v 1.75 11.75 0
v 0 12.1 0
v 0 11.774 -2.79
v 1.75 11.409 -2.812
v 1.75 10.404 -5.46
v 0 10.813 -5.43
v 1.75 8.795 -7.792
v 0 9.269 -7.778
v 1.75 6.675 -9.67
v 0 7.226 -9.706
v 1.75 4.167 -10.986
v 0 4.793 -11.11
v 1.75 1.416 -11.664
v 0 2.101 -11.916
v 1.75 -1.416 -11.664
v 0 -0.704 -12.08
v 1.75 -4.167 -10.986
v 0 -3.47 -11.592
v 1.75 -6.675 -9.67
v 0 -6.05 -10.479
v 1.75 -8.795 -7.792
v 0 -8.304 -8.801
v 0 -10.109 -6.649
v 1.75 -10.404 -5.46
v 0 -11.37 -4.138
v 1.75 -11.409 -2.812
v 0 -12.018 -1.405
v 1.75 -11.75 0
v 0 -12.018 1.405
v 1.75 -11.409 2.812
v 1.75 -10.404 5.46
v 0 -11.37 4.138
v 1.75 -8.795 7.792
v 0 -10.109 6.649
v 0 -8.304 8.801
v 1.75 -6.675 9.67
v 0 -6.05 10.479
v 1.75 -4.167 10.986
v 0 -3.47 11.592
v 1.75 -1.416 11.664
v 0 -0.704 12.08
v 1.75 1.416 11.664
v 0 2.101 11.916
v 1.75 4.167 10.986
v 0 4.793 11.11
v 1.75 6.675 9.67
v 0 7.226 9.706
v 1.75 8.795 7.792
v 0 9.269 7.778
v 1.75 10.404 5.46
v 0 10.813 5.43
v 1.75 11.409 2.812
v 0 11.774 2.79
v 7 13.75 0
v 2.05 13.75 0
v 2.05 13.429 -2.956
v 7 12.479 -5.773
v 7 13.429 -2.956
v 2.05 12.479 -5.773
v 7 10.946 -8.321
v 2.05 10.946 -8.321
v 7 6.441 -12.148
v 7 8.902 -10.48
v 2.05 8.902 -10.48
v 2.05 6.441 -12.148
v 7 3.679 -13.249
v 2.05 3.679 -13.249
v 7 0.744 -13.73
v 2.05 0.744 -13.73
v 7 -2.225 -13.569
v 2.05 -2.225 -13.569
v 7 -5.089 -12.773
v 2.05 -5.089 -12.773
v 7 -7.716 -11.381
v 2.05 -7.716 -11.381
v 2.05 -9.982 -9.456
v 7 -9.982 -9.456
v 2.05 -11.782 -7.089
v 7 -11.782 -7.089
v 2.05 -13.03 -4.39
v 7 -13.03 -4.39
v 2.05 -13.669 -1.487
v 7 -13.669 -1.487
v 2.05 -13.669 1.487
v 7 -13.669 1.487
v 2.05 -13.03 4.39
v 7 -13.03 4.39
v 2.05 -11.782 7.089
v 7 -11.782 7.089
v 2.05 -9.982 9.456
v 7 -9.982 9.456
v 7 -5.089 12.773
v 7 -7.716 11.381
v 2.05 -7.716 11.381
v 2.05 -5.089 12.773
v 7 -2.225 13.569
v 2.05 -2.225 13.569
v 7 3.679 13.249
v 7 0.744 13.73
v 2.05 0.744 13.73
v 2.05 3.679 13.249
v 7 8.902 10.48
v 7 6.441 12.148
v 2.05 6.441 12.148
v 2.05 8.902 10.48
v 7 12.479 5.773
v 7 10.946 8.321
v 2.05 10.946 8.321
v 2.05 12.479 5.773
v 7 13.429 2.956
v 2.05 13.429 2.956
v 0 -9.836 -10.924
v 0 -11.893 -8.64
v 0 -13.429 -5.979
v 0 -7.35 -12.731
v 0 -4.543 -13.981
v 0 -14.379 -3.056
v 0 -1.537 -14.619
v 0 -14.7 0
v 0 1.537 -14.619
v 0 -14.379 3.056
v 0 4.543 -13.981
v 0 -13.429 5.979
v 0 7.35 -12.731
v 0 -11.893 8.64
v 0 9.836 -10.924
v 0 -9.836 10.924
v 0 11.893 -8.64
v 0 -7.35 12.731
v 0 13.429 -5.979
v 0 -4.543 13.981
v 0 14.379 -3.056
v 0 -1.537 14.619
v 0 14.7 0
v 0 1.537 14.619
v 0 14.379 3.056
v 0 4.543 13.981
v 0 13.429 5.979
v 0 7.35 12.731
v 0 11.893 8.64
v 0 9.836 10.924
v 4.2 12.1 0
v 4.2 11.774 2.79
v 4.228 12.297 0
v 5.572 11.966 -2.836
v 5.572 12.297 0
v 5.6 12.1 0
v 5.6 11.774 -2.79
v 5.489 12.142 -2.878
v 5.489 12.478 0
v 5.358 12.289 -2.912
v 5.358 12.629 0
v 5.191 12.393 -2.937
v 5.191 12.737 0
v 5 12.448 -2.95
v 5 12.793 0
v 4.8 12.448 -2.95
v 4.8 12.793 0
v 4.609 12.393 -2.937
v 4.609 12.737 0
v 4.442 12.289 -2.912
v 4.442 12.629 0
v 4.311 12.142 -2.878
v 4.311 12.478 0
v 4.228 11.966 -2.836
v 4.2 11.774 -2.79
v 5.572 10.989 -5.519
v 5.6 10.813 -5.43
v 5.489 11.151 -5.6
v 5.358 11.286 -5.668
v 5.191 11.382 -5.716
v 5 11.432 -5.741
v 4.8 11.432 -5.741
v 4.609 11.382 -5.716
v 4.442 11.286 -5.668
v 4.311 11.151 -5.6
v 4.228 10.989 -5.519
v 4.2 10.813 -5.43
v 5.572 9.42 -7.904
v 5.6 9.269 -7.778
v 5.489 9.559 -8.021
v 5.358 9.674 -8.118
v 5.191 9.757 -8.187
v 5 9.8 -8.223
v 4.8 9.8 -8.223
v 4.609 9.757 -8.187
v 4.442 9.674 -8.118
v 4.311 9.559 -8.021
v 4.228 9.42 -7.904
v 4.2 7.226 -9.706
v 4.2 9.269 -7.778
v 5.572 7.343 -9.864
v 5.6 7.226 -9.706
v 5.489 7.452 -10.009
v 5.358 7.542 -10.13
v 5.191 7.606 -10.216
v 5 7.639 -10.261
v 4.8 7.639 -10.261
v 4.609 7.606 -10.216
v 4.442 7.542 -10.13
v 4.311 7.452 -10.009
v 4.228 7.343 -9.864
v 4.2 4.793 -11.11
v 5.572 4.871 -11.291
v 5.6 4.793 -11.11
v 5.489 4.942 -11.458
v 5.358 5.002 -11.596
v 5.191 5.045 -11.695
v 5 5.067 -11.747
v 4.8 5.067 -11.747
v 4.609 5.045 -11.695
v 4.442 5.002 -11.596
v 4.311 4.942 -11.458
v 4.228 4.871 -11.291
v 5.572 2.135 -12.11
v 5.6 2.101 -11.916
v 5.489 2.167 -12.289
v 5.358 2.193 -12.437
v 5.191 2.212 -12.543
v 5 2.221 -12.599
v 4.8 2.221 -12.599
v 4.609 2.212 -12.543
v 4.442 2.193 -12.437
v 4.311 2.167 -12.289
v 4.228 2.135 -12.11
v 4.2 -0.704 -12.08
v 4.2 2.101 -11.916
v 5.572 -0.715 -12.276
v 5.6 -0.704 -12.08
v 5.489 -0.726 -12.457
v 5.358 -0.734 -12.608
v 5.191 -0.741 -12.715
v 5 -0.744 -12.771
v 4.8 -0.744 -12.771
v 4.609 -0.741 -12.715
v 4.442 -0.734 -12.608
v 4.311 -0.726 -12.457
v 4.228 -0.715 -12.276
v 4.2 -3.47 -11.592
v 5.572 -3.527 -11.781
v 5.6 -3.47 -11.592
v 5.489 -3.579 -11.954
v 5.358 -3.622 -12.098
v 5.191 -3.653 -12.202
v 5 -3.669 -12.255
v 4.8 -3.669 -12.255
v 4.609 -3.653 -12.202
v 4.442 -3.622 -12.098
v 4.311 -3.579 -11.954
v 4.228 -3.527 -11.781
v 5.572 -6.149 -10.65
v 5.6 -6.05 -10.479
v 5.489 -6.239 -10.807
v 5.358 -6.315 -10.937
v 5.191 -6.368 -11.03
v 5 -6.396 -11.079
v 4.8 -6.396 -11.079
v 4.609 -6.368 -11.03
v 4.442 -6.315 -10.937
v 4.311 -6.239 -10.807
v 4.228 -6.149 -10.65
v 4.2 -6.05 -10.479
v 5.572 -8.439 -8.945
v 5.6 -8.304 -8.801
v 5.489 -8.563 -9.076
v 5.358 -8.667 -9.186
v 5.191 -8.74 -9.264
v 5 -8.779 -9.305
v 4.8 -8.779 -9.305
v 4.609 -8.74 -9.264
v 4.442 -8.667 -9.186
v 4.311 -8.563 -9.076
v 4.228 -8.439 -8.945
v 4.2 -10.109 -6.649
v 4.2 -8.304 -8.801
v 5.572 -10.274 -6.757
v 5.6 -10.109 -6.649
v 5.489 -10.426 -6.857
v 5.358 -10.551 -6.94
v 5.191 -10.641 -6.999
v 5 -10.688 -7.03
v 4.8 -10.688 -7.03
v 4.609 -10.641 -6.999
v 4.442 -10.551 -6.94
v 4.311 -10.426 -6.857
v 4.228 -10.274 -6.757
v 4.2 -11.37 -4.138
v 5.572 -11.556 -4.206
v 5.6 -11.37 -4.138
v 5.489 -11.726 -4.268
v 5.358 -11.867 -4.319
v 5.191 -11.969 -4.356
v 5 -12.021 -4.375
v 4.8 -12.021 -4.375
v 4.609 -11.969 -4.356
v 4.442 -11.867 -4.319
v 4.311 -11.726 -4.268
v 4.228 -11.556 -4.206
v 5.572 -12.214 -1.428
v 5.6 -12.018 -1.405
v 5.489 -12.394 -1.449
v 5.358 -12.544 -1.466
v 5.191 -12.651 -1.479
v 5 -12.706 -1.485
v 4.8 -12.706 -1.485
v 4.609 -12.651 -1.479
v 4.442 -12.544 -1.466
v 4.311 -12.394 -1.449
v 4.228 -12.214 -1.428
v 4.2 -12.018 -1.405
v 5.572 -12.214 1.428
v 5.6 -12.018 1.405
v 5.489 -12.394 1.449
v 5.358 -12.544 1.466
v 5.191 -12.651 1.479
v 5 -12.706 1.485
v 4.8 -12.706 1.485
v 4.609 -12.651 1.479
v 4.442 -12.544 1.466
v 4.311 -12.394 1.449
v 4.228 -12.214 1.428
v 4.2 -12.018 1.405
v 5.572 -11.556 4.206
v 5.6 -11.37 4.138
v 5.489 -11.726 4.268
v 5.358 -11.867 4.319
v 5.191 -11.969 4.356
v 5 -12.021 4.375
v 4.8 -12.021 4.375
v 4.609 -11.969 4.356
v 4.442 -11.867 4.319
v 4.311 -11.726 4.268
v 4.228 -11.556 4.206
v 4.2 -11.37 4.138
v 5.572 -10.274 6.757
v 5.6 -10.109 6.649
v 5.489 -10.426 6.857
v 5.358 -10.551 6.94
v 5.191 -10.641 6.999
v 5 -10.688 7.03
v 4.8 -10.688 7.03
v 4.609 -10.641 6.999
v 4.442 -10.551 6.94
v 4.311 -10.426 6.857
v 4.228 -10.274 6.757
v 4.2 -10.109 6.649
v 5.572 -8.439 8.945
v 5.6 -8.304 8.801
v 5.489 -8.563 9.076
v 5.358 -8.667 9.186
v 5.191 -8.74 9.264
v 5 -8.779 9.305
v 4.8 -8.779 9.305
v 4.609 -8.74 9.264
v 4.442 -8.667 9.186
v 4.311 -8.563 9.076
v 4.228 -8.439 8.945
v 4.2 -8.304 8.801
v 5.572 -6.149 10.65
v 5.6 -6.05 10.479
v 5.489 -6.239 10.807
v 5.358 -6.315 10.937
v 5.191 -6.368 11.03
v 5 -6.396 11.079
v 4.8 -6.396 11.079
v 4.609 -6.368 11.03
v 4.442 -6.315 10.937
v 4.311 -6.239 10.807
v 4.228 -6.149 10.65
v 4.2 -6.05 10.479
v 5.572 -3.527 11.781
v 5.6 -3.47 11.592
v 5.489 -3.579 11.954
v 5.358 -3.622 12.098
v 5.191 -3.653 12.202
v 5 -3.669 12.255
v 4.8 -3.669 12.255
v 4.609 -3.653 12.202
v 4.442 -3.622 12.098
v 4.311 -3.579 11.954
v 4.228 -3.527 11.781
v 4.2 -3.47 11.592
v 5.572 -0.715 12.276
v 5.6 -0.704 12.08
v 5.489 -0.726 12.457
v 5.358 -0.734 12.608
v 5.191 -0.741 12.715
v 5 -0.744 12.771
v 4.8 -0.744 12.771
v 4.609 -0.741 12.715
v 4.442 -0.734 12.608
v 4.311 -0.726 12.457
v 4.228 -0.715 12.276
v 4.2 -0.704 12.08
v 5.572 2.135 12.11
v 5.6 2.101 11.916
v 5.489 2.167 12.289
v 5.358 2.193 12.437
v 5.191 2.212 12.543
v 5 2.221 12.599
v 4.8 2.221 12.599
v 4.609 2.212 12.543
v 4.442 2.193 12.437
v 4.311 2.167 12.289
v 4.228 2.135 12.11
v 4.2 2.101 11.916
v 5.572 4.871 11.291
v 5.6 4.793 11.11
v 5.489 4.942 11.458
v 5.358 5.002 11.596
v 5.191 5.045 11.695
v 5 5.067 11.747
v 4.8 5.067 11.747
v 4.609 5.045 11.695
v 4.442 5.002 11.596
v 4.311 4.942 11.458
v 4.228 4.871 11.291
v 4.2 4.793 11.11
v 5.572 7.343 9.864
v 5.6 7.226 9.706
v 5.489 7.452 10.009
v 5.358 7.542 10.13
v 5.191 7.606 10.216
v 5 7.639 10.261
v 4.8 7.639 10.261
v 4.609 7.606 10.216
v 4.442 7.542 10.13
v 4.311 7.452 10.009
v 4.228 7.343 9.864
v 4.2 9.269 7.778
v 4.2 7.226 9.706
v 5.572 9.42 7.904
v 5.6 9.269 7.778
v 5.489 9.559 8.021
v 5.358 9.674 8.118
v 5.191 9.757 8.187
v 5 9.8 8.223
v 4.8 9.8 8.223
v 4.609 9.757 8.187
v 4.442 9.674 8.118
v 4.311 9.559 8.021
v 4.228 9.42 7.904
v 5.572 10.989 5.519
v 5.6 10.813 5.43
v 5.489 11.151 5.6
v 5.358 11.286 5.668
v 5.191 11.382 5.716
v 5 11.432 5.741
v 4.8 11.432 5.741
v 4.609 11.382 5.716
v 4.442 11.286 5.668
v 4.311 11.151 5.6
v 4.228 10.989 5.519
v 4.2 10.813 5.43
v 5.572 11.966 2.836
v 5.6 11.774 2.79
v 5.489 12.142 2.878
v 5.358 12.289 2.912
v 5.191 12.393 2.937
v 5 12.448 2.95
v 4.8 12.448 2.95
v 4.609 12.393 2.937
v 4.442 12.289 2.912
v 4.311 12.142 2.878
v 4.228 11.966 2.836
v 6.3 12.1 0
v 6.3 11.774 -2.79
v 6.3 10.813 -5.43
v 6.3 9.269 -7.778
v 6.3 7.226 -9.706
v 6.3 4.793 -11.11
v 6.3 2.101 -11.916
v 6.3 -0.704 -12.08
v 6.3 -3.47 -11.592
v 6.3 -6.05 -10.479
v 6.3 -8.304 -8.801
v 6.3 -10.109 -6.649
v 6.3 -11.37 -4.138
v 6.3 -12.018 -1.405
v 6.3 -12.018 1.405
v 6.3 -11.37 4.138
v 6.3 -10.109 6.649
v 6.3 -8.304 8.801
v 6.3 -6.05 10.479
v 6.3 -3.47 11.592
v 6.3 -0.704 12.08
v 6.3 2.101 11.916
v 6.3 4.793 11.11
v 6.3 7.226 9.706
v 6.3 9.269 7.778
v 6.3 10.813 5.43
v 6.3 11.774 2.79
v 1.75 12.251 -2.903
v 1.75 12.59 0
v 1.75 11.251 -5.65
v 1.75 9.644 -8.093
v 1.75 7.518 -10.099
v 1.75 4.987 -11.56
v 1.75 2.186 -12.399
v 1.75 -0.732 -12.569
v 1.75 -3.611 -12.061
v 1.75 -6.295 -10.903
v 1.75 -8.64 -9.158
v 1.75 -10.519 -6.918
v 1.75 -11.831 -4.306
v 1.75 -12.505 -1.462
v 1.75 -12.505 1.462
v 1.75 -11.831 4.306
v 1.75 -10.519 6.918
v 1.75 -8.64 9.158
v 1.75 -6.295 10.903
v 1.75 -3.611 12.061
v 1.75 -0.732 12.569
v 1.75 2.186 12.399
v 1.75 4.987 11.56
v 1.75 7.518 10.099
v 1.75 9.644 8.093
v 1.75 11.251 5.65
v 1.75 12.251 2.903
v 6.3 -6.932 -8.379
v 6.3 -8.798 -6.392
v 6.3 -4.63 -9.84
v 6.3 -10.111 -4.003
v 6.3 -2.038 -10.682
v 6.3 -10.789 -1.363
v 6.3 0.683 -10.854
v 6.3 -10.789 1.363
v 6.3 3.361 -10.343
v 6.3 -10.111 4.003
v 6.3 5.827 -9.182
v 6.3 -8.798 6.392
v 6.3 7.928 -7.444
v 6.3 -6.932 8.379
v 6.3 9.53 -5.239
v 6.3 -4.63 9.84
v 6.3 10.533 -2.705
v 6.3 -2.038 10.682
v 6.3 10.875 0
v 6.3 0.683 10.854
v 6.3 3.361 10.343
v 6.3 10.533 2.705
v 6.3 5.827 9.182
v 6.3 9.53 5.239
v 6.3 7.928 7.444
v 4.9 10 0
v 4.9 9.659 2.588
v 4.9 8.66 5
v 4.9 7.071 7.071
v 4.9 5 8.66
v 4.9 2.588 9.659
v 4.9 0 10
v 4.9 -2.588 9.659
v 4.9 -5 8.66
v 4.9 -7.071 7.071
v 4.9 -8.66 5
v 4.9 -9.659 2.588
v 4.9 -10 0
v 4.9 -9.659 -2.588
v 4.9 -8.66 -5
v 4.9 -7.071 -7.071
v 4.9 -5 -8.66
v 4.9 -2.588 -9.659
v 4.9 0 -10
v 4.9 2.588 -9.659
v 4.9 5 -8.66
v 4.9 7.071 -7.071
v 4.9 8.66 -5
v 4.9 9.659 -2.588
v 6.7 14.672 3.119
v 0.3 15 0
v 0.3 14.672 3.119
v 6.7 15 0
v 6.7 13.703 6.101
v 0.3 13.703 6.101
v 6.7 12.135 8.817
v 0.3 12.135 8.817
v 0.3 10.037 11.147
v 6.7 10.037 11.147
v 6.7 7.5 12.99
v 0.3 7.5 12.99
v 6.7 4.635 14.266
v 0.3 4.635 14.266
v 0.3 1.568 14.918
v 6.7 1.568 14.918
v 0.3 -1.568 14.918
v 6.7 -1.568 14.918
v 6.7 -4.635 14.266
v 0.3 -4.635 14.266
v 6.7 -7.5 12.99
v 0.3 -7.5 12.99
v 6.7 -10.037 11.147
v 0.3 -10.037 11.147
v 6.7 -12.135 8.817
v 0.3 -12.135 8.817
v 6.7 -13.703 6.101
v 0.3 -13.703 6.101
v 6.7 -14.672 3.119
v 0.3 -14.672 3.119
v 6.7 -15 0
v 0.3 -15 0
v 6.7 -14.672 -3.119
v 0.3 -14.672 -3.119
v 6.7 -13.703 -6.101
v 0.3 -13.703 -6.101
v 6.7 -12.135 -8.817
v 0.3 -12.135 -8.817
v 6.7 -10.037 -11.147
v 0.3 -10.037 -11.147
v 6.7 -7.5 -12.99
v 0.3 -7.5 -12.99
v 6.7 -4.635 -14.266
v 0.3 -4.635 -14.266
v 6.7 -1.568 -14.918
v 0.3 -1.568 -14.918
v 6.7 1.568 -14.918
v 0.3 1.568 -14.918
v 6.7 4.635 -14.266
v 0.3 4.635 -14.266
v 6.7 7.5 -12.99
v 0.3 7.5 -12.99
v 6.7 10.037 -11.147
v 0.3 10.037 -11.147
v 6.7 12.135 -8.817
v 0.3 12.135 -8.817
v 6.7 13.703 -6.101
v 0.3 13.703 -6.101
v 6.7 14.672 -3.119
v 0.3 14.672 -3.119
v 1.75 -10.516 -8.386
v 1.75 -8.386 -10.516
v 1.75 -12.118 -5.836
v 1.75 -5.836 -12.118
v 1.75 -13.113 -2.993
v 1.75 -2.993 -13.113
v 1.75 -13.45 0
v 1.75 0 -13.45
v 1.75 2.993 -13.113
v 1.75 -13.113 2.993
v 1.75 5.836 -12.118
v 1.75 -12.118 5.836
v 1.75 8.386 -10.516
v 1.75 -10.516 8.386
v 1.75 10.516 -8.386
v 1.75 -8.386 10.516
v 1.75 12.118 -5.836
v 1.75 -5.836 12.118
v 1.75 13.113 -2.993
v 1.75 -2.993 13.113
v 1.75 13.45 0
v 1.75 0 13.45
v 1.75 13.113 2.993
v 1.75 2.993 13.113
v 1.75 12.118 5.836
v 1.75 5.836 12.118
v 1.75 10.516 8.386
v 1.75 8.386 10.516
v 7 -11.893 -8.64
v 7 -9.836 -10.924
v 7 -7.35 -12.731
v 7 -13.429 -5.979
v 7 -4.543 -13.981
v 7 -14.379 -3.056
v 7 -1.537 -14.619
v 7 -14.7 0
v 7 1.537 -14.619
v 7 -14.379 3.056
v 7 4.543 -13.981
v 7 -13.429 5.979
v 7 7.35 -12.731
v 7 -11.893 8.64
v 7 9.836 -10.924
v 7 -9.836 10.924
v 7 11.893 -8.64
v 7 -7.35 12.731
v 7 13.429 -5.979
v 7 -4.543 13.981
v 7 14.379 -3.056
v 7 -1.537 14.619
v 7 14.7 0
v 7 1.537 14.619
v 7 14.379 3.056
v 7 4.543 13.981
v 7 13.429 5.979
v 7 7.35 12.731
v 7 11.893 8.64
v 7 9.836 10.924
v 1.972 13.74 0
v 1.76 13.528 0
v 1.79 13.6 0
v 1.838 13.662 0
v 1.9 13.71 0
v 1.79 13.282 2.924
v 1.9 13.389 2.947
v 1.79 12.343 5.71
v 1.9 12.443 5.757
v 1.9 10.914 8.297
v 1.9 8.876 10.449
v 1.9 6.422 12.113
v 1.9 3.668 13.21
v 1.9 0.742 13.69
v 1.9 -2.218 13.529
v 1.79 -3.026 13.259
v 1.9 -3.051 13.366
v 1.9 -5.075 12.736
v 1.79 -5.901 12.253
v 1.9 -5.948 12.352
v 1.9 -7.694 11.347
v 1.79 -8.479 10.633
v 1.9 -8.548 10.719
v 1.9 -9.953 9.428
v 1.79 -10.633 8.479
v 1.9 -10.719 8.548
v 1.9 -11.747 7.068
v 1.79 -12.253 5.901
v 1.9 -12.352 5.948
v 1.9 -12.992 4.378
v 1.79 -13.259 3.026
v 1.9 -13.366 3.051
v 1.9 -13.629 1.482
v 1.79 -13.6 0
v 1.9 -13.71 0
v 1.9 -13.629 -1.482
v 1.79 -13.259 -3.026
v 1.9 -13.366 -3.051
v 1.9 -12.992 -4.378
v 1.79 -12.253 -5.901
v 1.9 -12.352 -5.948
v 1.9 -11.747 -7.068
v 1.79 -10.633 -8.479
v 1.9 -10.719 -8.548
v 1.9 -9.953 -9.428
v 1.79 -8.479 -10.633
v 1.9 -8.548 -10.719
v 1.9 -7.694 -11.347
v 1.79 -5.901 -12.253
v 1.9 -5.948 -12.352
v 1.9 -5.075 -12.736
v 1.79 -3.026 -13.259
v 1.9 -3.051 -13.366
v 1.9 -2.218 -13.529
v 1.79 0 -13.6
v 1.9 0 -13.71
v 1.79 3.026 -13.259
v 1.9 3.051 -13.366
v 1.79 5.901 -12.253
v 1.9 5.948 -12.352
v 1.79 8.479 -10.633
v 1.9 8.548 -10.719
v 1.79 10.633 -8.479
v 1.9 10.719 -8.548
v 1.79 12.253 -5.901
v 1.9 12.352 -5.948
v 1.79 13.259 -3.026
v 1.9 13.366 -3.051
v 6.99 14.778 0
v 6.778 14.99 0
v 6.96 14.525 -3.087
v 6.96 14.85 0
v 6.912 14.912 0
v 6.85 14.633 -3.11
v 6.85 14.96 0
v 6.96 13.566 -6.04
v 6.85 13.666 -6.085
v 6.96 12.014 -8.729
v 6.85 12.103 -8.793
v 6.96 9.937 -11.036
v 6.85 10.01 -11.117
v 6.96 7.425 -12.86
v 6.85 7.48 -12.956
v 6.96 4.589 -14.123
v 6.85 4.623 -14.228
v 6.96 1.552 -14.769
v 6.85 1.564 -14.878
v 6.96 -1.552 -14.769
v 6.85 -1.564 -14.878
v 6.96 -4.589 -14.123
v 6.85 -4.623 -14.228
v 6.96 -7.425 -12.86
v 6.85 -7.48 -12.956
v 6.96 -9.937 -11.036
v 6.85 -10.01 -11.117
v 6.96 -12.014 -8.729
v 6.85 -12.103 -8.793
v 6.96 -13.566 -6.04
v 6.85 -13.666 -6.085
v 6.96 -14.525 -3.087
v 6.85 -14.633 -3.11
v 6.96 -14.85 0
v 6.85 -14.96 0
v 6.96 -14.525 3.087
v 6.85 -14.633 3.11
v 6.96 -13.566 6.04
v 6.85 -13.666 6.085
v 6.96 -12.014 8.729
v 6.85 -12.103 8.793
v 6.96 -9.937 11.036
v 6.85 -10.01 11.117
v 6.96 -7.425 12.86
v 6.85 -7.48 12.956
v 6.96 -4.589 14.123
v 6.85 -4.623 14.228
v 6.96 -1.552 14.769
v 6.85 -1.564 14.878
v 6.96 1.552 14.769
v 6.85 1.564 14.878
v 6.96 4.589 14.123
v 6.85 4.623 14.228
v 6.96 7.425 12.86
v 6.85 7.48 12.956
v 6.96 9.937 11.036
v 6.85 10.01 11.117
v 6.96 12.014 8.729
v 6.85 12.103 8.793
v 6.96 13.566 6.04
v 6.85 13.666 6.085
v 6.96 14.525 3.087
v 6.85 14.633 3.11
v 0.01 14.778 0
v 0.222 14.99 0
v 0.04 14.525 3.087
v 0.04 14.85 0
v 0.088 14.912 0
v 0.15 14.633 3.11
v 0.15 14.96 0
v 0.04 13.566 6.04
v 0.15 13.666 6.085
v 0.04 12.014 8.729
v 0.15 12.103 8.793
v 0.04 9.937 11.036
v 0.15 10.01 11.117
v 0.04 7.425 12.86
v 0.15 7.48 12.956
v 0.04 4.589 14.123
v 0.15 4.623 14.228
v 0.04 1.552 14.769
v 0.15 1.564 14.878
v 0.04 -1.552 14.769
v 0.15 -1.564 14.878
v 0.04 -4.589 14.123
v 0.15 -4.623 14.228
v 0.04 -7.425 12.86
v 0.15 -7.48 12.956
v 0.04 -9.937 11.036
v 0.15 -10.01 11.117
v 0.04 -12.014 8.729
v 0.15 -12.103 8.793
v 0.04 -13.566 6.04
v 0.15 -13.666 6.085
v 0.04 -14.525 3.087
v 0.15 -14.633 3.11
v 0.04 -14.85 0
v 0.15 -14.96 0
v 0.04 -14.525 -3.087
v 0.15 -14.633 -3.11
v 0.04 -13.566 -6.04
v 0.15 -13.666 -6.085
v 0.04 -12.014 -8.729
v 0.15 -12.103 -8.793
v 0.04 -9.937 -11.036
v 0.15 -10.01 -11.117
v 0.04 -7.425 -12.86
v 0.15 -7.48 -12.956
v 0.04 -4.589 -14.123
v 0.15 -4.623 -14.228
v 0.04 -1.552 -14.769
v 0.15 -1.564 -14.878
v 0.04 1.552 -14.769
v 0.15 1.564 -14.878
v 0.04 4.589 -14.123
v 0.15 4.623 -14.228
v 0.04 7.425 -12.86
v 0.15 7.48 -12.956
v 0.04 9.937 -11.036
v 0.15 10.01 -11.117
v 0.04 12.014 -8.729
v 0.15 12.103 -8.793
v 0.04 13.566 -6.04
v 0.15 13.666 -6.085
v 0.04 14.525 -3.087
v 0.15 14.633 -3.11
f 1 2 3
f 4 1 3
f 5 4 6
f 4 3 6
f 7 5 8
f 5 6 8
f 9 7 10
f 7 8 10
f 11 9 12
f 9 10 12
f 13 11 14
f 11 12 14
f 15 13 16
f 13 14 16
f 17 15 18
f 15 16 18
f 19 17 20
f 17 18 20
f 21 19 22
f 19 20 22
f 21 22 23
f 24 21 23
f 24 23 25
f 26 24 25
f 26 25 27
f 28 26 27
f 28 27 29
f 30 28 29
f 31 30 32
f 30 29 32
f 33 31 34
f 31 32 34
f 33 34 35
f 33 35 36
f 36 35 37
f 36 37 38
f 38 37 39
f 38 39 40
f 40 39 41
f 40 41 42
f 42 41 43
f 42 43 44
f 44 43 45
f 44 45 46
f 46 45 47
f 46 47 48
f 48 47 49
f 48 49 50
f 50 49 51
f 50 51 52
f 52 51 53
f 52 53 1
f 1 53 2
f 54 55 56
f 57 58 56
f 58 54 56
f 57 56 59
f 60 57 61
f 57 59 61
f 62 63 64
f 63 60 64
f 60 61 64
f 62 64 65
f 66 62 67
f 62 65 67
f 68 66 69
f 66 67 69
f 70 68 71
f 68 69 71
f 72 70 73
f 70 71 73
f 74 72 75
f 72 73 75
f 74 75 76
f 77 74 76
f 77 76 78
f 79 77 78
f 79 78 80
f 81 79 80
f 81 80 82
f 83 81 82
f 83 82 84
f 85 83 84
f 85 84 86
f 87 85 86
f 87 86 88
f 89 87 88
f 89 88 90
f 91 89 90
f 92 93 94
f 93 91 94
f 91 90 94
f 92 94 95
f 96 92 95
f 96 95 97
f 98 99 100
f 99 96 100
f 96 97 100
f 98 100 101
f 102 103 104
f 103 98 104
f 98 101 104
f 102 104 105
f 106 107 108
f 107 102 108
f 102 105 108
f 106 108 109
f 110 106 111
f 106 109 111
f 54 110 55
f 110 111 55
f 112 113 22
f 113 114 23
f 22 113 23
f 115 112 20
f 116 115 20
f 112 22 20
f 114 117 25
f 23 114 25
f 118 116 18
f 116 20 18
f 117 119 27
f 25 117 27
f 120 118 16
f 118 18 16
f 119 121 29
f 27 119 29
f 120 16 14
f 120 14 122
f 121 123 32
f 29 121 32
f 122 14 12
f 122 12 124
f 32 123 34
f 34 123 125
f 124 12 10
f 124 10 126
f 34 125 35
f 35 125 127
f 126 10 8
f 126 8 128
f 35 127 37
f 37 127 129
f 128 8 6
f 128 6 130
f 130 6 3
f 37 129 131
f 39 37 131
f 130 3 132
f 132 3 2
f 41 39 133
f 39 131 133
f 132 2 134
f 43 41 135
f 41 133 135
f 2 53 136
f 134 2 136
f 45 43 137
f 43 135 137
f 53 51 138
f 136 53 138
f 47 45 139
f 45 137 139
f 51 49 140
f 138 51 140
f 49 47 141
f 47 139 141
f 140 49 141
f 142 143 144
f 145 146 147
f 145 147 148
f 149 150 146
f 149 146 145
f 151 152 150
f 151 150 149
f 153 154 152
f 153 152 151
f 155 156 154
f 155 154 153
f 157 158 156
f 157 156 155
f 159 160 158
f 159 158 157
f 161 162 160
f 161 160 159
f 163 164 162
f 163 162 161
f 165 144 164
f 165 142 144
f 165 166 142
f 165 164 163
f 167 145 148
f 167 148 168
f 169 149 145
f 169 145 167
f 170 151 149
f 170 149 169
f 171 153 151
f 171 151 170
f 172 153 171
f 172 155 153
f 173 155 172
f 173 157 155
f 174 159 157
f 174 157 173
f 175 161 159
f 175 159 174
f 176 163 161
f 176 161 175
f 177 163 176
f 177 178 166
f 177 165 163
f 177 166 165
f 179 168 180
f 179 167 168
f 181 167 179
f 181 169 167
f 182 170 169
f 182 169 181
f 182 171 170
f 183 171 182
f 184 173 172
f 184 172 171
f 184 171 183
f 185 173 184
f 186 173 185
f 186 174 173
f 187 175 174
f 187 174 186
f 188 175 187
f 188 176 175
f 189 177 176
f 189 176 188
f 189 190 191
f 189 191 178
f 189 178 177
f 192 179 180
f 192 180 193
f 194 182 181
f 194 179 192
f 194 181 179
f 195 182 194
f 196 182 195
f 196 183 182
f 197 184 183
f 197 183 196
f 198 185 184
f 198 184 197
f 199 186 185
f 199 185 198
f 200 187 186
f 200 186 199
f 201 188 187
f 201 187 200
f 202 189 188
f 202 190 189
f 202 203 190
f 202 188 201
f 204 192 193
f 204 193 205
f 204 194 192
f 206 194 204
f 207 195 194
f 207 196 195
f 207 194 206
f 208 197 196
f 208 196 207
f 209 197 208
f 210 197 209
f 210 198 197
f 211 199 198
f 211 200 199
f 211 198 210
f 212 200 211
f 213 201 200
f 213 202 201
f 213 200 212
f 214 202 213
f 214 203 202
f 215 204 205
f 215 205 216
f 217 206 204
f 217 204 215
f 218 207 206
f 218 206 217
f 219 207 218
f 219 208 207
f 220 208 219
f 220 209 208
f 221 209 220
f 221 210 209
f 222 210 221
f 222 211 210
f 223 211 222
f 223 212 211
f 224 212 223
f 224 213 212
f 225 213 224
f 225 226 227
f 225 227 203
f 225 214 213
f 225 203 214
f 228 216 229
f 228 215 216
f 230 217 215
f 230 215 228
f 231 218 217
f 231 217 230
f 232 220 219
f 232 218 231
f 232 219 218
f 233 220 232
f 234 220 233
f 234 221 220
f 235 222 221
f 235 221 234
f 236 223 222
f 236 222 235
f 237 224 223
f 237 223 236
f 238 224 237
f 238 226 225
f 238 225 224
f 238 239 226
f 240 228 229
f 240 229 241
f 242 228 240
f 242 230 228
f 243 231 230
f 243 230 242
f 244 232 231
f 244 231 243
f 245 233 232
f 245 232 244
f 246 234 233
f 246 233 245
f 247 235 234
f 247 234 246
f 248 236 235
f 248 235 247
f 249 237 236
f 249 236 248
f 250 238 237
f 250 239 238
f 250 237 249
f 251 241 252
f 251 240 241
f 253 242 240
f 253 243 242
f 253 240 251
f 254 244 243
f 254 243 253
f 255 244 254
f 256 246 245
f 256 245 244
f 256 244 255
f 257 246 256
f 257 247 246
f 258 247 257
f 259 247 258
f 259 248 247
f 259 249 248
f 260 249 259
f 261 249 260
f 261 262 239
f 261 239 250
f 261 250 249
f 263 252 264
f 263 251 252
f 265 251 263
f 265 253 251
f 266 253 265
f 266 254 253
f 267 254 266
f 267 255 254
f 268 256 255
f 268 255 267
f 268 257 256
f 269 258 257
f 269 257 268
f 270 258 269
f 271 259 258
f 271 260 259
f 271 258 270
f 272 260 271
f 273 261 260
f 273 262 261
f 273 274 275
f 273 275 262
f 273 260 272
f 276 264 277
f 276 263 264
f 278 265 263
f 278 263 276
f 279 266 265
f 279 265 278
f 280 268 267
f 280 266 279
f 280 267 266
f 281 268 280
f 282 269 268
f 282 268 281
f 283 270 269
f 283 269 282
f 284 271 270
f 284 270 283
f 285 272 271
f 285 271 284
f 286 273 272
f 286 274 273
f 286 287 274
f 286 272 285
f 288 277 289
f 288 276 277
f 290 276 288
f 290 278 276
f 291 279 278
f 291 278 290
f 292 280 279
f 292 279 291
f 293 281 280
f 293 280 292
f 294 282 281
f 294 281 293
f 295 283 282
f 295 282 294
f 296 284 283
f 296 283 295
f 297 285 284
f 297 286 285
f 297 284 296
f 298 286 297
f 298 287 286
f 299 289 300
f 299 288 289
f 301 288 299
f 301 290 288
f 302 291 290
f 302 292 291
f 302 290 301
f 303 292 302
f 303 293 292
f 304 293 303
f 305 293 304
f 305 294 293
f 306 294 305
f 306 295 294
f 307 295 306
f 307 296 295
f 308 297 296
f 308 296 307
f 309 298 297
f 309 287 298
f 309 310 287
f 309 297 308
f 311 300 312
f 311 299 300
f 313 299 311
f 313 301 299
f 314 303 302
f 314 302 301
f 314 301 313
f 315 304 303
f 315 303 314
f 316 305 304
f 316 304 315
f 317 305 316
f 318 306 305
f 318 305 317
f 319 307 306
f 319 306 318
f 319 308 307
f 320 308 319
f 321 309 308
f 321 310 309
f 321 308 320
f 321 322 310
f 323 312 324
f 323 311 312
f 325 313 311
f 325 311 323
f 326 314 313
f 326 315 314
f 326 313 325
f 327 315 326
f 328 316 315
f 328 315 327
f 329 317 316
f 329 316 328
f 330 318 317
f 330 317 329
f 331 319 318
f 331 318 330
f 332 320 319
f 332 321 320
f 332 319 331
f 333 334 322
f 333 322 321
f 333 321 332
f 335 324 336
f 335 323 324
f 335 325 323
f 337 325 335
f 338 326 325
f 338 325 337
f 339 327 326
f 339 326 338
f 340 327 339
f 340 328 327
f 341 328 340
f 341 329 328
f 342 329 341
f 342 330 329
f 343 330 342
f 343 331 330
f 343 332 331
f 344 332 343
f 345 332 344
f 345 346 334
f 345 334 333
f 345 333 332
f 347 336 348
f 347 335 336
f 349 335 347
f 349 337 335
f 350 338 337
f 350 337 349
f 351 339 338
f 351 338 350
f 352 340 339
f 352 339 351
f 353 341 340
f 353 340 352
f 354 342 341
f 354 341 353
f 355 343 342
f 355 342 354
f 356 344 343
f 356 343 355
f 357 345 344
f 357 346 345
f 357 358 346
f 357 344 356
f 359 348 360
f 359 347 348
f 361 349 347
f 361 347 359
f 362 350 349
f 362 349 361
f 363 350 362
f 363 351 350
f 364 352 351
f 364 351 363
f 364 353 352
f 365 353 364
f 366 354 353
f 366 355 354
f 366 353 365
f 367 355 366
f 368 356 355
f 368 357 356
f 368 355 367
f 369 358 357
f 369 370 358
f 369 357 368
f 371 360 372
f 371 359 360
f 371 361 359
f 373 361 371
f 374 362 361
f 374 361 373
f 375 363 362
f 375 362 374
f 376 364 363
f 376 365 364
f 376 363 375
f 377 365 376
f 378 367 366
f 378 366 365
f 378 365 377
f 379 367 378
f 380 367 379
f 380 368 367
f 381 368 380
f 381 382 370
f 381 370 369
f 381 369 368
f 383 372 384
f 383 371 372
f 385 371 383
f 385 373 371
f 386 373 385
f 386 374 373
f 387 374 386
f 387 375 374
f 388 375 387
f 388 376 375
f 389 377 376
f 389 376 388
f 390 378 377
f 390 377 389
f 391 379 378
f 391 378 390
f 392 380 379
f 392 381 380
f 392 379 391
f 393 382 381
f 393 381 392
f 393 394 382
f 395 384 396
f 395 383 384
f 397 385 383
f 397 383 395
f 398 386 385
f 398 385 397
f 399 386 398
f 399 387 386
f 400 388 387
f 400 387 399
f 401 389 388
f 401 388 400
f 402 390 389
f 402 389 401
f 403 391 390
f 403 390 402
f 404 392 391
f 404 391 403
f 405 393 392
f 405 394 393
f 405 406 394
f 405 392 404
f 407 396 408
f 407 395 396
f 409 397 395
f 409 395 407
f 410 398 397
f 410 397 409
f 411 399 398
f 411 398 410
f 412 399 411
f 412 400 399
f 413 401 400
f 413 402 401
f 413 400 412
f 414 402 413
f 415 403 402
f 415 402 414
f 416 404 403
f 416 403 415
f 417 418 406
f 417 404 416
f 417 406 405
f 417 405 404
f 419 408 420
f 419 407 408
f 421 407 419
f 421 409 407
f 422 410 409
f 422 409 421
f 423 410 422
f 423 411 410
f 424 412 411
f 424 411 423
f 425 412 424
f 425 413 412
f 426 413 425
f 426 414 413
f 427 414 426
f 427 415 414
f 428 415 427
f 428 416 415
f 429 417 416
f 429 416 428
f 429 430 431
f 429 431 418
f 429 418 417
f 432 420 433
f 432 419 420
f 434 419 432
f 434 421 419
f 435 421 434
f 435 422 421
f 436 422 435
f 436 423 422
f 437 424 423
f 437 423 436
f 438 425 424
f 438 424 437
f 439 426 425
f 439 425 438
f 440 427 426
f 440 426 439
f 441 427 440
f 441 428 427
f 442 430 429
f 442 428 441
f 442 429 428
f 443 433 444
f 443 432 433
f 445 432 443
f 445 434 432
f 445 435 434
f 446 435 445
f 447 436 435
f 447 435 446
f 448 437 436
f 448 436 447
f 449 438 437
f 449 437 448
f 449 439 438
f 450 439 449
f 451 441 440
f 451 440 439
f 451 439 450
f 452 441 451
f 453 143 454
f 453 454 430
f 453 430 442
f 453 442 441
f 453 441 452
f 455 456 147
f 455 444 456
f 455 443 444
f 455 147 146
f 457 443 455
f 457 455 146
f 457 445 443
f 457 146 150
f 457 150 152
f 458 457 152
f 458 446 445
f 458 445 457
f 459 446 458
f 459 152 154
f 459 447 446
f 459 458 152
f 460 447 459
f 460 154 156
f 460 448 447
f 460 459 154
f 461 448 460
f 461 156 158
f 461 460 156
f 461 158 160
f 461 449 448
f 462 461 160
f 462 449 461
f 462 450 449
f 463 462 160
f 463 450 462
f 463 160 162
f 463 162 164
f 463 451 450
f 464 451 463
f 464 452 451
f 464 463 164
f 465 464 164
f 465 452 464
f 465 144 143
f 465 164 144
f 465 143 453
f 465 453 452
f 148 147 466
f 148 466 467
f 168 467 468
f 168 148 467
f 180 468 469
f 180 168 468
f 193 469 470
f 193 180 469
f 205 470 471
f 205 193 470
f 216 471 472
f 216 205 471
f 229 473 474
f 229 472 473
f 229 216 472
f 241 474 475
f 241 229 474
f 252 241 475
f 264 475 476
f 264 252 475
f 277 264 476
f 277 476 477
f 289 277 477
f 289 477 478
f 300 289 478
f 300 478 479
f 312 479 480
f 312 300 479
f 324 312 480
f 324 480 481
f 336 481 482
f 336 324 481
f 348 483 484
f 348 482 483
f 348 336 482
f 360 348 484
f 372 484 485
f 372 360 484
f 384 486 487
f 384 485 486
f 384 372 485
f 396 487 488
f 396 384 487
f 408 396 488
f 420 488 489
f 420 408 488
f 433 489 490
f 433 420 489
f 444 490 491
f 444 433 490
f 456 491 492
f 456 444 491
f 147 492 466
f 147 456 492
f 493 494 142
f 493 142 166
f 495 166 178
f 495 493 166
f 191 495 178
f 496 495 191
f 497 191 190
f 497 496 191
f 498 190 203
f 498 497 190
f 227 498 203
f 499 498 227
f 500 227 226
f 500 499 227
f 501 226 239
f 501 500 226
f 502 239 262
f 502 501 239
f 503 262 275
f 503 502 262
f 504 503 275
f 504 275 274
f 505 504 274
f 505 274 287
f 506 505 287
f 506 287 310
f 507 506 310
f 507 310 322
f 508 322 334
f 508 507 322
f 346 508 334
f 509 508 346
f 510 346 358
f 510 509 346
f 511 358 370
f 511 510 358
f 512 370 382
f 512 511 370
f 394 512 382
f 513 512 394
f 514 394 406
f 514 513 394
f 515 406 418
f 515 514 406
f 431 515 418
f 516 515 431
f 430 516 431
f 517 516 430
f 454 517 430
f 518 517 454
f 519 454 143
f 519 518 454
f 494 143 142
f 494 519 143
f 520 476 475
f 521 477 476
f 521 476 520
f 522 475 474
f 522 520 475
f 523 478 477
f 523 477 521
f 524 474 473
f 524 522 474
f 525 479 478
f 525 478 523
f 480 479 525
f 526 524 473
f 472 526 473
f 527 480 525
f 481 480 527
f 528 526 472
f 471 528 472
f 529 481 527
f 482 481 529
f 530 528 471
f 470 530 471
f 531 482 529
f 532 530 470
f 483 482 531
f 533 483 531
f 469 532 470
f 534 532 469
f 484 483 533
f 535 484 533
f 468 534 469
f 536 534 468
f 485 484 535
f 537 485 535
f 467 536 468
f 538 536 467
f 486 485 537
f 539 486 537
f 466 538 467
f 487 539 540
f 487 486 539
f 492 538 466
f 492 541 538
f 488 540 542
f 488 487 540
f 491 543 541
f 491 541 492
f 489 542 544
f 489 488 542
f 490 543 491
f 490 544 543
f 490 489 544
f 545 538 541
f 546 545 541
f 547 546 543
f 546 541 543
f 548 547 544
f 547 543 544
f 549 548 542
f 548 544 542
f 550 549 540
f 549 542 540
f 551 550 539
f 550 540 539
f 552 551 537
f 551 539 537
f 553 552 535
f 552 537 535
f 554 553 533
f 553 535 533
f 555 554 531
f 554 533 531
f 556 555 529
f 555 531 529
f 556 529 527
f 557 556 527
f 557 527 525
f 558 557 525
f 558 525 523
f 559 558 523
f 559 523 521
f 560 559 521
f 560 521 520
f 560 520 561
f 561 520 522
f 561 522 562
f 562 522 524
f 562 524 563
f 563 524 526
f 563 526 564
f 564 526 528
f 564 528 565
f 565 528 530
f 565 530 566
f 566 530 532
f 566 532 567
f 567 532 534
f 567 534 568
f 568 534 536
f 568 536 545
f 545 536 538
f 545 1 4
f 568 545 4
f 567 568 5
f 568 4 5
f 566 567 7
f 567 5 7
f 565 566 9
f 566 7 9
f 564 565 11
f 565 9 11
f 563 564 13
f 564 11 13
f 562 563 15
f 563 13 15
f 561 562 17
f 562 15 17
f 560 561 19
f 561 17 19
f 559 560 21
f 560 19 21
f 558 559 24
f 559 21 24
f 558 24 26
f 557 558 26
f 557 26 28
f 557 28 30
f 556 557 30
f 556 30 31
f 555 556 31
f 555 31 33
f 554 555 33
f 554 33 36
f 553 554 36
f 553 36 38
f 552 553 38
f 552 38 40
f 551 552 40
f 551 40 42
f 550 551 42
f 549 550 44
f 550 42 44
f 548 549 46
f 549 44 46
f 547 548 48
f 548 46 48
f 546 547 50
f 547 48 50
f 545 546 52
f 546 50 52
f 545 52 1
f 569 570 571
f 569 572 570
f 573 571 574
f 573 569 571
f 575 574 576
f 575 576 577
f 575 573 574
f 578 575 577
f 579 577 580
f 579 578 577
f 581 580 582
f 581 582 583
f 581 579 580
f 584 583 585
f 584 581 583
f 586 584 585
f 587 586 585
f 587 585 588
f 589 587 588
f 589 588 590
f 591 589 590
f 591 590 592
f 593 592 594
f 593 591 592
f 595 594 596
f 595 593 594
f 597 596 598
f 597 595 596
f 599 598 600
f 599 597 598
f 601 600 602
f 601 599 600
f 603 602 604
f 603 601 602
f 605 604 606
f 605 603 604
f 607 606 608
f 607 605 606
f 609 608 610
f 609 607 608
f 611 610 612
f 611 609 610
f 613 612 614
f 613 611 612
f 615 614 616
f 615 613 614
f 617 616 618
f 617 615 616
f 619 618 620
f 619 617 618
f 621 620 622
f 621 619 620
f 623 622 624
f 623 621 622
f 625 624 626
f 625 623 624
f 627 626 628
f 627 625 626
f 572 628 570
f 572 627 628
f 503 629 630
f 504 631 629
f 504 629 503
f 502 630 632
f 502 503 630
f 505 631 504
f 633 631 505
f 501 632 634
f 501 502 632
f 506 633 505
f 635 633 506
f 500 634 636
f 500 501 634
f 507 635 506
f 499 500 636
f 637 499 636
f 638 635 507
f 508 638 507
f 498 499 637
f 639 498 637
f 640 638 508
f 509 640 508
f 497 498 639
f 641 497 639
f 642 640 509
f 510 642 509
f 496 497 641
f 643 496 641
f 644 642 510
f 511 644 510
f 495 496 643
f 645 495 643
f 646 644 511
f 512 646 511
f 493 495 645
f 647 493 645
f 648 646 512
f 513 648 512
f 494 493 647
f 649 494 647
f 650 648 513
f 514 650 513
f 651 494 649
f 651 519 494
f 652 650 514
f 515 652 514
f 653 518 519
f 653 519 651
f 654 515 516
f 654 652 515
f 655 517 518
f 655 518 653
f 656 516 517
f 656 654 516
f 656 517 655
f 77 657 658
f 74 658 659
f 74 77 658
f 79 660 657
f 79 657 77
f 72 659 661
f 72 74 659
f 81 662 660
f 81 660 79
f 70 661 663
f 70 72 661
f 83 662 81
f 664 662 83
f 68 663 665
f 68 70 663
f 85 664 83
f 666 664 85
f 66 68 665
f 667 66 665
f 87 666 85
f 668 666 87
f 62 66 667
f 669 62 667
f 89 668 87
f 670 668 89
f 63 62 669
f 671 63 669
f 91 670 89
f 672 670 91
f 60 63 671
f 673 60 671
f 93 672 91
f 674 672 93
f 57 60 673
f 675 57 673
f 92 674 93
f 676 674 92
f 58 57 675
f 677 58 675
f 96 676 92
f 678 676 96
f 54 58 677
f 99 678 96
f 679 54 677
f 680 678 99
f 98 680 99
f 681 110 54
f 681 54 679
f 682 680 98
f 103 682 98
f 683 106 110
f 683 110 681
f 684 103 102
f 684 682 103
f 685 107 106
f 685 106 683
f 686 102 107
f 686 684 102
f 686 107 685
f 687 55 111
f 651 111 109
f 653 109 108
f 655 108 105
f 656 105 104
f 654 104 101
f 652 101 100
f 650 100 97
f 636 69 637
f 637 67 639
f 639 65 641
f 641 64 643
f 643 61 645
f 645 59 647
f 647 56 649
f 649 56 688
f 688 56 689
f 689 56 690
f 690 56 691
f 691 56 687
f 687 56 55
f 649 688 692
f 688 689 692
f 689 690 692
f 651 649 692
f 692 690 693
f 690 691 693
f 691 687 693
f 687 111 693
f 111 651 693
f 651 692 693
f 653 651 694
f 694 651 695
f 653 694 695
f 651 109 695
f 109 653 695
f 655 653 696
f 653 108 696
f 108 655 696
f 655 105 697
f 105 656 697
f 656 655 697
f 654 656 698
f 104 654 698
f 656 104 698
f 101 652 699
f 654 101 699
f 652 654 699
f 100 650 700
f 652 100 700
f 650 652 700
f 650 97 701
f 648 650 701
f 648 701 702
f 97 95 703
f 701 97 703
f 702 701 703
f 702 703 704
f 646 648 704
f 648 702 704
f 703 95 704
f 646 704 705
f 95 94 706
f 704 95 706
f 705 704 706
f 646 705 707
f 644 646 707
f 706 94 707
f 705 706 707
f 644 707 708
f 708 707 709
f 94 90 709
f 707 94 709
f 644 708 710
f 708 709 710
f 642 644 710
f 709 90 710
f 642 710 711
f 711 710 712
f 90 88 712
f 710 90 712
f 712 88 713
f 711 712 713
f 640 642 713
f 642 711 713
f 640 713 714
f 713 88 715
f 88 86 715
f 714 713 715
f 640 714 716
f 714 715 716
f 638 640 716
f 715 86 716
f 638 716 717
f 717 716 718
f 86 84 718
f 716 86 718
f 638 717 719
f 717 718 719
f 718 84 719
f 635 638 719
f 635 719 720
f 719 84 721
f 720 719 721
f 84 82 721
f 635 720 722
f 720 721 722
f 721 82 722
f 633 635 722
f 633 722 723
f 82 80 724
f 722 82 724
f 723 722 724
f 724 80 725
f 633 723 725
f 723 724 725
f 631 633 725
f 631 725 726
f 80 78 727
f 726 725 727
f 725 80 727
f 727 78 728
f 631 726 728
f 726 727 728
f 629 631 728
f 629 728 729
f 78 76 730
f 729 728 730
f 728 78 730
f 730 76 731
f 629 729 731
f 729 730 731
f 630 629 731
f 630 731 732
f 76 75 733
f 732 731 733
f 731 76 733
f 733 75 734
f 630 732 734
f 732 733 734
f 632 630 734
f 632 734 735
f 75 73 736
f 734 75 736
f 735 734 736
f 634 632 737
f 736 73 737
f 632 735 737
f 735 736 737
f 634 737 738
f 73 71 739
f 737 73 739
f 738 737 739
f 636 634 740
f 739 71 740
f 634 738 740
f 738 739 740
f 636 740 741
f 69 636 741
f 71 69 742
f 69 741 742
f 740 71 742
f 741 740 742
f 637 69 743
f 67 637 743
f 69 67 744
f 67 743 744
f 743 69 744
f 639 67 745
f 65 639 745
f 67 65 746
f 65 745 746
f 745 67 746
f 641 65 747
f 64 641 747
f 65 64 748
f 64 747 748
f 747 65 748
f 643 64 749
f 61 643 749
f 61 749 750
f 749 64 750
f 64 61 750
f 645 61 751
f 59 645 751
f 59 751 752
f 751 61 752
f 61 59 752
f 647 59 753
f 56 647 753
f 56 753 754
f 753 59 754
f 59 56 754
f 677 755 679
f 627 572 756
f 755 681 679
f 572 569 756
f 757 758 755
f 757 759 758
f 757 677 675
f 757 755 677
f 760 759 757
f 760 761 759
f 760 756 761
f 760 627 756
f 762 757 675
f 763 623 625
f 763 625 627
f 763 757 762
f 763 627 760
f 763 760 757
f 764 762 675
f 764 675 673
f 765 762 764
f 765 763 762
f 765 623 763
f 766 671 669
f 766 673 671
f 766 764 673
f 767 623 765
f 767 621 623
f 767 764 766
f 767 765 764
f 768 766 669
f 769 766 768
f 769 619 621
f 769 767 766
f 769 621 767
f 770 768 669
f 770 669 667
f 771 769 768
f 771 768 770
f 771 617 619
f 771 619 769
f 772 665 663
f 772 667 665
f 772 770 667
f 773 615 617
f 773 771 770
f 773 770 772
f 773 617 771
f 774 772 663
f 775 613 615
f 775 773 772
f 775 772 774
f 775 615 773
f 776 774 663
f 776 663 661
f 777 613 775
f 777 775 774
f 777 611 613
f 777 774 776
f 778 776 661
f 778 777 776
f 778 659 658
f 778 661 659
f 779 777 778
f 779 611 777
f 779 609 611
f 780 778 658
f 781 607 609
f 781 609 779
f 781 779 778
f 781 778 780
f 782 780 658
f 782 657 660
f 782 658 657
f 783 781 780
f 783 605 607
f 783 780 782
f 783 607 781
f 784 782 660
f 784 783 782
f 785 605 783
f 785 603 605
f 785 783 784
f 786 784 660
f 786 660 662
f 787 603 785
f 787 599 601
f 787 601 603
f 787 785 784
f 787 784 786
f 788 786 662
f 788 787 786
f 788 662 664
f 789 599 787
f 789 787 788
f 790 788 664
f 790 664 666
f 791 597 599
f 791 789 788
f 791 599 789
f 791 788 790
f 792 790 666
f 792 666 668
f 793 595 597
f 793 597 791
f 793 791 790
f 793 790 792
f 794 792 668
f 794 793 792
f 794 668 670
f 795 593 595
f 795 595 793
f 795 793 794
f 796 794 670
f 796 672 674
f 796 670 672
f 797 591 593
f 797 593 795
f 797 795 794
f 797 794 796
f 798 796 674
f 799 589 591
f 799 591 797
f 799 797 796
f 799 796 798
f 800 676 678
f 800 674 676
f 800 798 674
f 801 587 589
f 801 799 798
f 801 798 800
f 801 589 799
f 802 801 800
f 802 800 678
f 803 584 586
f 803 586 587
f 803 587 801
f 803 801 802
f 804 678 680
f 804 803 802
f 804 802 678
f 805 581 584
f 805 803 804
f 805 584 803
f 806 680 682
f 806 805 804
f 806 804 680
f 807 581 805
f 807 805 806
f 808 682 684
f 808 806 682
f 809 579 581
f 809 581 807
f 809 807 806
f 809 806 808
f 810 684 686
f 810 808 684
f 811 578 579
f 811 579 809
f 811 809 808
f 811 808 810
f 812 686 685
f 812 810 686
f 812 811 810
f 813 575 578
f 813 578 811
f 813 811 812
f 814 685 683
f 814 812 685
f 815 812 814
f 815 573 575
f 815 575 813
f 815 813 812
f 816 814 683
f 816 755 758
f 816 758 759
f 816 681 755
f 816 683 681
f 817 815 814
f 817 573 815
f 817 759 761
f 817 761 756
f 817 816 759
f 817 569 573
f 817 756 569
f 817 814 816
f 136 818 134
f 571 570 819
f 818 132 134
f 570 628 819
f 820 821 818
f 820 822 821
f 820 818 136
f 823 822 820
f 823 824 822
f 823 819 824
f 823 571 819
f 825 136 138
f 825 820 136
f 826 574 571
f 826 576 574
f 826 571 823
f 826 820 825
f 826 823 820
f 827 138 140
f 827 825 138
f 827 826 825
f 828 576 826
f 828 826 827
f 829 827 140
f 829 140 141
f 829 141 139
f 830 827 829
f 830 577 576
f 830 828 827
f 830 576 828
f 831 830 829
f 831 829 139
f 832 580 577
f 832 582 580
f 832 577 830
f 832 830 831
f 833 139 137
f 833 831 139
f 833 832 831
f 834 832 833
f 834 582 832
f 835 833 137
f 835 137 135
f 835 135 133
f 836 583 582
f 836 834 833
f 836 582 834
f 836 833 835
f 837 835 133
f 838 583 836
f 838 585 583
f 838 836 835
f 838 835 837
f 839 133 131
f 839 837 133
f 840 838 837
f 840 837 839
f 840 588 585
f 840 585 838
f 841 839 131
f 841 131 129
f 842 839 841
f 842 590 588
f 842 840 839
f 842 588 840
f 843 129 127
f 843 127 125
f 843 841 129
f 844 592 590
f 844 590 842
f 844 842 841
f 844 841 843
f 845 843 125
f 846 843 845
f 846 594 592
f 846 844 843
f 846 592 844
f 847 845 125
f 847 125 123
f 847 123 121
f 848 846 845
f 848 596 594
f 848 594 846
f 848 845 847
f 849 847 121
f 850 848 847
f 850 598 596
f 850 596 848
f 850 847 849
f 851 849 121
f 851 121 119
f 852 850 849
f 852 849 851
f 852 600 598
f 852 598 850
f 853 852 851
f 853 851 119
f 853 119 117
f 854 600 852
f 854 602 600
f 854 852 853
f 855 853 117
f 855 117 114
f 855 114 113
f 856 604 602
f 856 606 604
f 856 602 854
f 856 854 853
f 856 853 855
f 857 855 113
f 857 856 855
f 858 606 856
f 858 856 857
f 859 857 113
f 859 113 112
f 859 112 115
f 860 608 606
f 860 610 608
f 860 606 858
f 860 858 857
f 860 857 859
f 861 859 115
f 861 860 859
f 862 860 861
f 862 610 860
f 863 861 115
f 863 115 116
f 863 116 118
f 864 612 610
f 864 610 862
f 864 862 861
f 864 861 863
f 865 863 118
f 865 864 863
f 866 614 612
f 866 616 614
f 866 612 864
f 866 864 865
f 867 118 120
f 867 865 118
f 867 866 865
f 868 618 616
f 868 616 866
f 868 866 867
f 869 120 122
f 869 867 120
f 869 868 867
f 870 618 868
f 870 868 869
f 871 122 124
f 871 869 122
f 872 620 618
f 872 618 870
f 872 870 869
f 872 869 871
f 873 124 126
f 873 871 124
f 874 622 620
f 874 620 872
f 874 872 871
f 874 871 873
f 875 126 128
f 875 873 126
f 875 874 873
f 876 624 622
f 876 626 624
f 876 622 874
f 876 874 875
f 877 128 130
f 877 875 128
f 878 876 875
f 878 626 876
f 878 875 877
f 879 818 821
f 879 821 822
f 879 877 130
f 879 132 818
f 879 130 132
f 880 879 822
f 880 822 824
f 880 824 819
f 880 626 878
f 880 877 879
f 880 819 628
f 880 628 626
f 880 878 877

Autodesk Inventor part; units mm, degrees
ref_plane "YZ Plane" through (0, 0, 0) normal (1, 0, 0) x (0, 1, 0)
ref_plane "XZ Plane" through (0, 0, 0) normal (0, 1, 0) x (-1, 0, 0)
ref_plane "XY Plane" through (0, 0, 0) normal (0, 0, 1) x (1, 0, 0)
sketch "Skizze1" plane through (0, 0, 0) normal (0, 0, 1) x (1, 0, 0)
  circle A0 centre (4.9, 12.1) radius 0.455
  circle A1 centre (4.9, 12.1) radius 0.7
  line L0 (6.3, 10.875) -> (6.3, 12.1)
  line L1 (0, 15) -> (7, 15)
  line L2 (7, 15) -> (7, 13.75)
  line L3 (7, 13.75) -> (1.75, 13.75)
  line L4 (0, 0) -> (9.5856, 0)
  line L5 (0, 15) -> (0, 12.1)
  line L6 (0, 12.1) -> (1.75, 11.75)
  line L7 (1.75, 11.75) -> (4.9, 10)
  line L8 (4.9, 10) -> (6.3, 10.875)
  line L9 (4.9, 10) -> (0, 10) construction
  line L10 (0, 18) -> (0, -3) projected
  line L11 (-1.9171, 0) -> (11.5027, 0) projected
  line L12 (4.2, 12.1) -> (1.75, 12.59)
  line L13 (1.75, 12.59) -> (1.75, 13.75)
  line L14 (6.3, 12.1) -> (5.6, 12.1)
  dimension "d0" = 30
  dimension "d1" = 21.75
  dimension "d2" = 1.25
  dimension "d3" = 0.91
  dimension "d4" = 1.4
  dimension "d5" = 20
  dimension "d6" = 23.5
  dimension "d7" = 24.2
  dimension "d8" = 4.9
  dimension "d9" = 6.3
  dimension "d10" = 7
  dimension "d12" = 1.75
revolve "Körper" add sketch "Skizze1" angle 360 about axis through (0, 0, 0) along (1, 0, 0) contours L14 L0 L8 L7 L6 L5 L1 L2 L3 L13 L12 A1
revolve "Feder1" add sketch "Skizze1" angle 360 about axis through (0, 0, 0) along (1, 0, 0) contours A0 | A1
fillet "Rundung1" radius 0.3 3 edges at (7, -15, 0) (1.75, -13.75, 0) (0, -15, 0)
equation "\"d0\" = SD2"
equation "\"d1\" = ABDM"
equation "\"d3\" = SPDI"
equation "\"d4\" = SPDA"
equation "\"d5\" = NND"
equation "\"d6\" = TKDM"
equation "\"d7\" = HLDM"
equation "\"d8\" = SPDST"
equation "\"d9\" = SDI"
equation "\"d10\" = SWDT"
equation "\"d12\" = SD"
equation "\"d11\" = RR"
equation "\"SD2\" = 30"
equation "\"SWDT\" = 7"
equation "\"RR\" = 0.3"
equation "\"SD\" = 1.75"
equation "\"NND\" = 20"
equation "\"SPDA\" = 1.4"
equation "\"SPDI\" = 0.91"
equation "\"TKDM\" = 23.5"
equation "\"HLDM\" = 24.2"
equation "\"ABDM\" = 21.75"
equation "\"SDI\" = 6.3"
equation "\"SPDST\" = 4.9"
equation "\"LAB\" = 0.35"
properties part number "DIN 3760 - A - 20 x 30 x 7 - NBR" material "Gummi"
